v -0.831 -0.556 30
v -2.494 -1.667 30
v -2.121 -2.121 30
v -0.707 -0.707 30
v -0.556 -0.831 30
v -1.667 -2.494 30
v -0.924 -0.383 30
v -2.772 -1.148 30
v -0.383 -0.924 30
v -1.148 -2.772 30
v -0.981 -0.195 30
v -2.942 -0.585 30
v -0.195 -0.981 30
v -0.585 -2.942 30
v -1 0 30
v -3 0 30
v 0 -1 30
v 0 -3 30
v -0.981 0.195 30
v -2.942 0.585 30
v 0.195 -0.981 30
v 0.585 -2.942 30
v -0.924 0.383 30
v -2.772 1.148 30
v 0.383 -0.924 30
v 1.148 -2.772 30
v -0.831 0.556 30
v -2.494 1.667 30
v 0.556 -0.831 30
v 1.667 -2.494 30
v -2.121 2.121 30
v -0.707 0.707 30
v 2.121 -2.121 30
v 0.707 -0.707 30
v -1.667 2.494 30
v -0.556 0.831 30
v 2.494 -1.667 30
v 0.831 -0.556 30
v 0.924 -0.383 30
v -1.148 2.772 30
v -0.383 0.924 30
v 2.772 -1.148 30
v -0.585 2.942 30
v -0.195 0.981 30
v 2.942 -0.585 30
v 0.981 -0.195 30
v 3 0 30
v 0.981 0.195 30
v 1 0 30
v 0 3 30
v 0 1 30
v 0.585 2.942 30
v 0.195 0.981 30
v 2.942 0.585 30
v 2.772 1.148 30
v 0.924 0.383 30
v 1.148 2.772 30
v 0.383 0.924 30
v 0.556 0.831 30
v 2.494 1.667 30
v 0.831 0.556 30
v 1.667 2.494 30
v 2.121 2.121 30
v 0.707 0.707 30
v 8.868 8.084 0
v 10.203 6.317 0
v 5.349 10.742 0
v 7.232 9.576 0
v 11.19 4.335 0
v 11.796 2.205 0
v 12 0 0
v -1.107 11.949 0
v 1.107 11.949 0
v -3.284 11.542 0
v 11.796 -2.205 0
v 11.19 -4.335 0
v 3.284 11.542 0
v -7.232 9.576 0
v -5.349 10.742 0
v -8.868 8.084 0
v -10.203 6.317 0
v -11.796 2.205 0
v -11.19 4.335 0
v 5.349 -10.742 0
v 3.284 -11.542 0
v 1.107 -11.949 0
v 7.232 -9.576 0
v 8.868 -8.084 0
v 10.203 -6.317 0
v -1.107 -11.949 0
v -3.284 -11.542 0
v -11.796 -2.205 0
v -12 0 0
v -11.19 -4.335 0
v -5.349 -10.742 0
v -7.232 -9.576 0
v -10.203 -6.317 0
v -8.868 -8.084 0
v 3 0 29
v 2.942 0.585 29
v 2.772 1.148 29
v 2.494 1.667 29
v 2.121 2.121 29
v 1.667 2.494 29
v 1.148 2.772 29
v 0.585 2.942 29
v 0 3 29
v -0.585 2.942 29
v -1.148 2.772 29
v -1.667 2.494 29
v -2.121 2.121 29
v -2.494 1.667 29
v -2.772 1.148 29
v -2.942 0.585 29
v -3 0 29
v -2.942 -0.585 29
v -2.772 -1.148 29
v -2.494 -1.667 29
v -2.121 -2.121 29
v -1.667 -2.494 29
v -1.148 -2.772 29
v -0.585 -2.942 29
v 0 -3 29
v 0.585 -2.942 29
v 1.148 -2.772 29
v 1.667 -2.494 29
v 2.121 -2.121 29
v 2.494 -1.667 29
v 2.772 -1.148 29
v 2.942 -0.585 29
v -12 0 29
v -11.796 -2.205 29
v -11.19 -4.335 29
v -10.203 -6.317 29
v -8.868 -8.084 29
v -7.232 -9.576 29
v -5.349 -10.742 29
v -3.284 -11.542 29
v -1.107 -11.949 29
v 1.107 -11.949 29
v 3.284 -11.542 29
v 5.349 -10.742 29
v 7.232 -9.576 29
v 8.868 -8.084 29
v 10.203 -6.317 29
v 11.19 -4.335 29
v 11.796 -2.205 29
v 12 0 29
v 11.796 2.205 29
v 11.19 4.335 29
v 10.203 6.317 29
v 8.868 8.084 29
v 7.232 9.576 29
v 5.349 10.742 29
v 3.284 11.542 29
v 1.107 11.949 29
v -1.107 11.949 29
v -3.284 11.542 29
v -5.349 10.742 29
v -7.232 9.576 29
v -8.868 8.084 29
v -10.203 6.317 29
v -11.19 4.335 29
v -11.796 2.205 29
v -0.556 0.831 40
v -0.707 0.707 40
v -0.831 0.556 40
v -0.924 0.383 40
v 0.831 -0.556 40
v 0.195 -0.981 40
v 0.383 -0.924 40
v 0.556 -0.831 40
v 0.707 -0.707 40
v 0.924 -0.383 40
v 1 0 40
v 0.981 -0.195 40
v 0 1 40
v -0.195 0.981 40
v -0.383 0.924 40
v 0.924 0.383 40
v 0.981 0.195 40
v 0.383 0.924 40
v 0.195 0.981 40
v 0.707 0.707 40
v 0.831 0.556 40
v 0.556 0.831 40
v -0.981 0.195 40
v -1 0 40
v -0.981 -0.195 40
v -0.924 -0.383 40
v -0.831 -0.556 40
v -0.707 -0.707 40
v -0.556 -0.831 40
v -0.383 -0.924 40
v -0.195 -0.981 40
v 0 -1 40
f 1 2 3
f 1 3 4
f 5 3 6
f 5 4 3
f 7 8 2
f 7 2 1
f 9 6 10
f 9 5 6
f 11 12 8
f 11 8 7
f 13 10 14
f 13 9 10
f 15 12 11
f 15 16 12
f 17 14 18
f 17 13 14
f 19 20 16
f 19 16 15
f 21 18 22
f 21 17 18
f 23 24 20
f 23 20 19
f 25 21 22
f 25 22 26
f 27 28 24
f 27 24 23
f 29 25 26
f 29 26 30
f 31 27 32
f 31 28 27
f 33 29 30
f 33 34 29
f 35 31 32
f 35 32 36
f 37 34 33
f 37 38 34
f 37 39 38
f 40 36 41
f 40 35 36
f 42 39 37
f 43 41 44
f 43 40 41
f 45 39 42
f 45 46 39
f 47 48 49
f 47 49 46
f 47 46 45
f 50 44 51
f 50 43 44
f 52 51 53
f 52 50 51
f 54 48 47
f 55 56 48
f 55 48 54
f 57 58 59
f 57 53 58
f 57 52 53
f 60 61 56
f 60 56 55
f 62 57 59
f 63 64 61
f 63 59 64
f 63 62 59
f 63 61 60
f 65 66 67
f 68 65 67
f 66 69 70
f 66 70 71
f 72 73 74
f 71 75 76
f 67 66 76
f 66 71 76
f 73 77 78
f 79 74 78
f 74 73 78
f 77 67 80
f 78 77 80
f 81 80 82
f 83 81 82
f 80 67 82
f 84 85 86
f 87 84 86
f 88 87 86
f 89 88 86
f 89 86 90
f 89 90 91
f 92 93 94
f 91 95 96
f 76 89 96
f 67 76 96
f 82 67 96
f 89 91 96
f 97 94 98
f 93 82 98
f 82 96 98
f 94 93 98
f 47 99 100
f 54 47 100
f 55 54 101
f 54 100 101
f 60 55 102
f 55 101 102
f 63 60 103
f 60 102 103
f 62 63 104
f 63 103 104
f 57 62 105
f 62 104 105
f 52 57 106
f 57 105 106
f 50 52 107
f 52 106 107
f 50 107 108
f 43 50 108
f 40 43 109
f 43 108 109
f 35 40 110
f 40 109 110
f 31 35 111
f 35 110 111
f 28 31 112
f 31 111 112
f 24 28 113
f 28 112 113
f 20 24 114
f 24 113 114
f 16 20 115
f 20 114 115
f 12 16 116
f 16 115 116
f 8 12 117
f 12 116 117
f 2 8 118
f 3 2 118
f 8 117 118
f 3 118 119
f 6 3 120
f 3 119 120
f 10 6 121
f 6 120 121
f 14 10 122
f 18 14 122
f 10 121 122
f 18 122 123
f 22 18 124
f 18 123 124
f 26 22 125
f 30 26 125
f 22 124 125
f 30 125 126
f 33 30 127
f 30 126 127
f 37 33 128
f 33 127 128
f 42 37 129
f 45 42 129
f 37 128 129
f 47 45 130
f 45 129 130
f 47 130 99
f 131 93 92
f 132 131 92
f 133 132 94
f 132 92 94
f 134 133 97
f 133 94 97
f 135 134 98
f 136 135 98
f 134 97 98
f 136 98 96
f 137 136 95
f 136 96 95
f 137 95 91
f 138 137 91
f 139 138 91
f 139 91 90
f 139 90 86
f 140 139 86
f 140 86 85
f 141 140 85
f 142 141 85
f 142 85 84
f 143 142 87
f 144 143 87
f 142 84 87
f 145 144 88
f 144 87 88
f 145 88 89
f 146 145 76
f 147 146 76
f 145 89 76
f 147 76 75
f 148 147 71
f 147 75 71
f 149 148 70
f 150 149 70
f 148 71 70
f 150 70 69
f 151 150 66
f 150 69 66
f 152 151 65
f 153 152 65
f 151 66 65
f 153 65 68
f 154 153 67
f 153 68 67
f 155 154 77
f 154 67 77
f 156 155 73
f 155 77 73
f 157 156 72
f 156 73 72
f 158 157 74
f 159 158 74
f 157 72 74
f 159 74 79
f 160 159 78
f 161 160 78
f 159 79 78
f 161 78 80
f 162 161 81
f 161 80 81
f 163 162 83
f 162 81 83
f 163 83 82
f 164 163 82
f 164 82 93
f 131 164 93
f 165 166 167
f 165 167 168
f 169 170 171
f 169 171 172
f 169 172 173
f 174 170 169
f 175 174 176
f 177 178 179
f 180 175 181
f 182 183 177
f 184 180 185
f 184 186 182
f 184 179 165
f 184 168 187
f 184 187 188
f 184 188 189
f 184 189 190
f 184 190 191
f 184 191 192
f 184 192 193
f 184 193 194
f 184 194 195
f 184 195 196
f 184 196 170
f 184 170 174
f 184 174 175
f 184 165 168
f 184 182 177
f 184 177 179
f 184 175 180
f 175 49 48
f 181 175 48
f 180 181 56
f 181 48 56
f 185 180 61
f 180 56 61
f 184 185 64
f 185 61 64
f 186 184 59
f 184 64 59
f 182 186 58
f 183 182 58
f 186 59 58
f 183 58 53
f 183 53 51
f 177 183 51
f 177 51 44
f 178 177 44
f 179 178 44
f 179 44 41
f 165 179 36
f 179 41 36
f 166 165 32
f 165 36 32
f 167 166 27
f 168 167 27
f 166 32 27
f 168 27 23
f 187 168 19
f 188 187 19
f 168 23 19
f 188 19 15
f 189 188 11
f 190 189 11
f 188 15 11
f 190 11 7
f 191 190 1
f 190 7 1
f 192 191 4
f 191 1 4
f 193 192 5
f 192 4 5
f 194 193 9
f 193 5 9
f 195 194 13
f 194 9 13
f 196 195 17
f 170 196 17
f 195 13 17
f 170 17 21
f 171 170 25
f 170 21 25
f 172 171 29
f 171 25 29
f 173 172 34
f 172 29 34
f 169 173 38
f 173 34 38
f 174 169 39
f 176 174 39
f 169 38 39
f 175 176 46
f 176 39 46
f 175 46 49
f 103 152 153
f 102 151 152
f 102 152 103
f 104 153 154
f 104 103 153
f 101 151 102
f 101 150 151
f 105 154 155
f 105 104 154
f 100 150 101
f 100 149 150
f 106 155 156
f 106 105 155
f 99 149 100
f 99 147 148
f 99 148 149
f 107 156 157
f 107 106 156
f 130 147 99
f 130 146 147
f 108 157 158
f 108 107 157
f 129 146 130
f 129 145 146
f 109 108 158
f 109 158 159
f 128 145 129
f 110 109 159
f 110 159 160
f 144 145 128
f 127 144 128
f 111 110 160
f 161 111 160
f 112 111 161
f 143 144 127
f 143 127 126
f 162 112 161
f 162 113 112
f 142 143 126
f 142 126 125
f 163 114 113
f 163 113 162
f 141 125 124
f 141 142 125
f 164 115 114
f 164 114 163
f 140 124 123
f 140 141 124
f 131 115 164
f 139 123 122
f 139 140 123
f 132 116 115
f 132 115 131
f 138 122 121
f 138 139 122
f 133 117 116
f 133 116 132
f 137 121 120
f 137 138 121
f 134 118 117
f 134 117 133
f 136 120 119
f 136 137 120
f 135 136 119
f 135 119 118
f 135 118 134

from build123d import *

# Parameters (mm, degrees)
SKETCH1_R           = 12
BOSS_EXTRUDE1_DEPTH = 29
SKETCH2_R           = 3
BOSS_EXTRUDE2_DEPTH = 1
SKETCH3_R           = 1
BOSS_EXTRUDE3_DEPTH = 10


with BuildPart() as part:
    # Sketch1 → Boss-Extrude1 (new body)
    with BuildSketch(Plane.XY):
        with Locations(Location((0, 0, 0), (0, 0, 180))):
            Circle(SKETCH1_R)
    extrude(amount=BOSS_EXTRUDE1_DEPTH)

    # Sketch2 → Boss-Extrude2 (add)
    with BuildSketch(Plane.XY.offset(29)):
        Circle(SKETCH2_R)
    extrude(amount=BOSS_EXTRUDE2_DEPTH)

    # Sketch3 → Boss-Extrude3 (add)
    with BuildSketch(Plane.XY.offset(30)):
        Circle(SKETCH3_R)
    extrude(amount=BOSS_EXTRUDE3_DEPTH)


solid = part.part
